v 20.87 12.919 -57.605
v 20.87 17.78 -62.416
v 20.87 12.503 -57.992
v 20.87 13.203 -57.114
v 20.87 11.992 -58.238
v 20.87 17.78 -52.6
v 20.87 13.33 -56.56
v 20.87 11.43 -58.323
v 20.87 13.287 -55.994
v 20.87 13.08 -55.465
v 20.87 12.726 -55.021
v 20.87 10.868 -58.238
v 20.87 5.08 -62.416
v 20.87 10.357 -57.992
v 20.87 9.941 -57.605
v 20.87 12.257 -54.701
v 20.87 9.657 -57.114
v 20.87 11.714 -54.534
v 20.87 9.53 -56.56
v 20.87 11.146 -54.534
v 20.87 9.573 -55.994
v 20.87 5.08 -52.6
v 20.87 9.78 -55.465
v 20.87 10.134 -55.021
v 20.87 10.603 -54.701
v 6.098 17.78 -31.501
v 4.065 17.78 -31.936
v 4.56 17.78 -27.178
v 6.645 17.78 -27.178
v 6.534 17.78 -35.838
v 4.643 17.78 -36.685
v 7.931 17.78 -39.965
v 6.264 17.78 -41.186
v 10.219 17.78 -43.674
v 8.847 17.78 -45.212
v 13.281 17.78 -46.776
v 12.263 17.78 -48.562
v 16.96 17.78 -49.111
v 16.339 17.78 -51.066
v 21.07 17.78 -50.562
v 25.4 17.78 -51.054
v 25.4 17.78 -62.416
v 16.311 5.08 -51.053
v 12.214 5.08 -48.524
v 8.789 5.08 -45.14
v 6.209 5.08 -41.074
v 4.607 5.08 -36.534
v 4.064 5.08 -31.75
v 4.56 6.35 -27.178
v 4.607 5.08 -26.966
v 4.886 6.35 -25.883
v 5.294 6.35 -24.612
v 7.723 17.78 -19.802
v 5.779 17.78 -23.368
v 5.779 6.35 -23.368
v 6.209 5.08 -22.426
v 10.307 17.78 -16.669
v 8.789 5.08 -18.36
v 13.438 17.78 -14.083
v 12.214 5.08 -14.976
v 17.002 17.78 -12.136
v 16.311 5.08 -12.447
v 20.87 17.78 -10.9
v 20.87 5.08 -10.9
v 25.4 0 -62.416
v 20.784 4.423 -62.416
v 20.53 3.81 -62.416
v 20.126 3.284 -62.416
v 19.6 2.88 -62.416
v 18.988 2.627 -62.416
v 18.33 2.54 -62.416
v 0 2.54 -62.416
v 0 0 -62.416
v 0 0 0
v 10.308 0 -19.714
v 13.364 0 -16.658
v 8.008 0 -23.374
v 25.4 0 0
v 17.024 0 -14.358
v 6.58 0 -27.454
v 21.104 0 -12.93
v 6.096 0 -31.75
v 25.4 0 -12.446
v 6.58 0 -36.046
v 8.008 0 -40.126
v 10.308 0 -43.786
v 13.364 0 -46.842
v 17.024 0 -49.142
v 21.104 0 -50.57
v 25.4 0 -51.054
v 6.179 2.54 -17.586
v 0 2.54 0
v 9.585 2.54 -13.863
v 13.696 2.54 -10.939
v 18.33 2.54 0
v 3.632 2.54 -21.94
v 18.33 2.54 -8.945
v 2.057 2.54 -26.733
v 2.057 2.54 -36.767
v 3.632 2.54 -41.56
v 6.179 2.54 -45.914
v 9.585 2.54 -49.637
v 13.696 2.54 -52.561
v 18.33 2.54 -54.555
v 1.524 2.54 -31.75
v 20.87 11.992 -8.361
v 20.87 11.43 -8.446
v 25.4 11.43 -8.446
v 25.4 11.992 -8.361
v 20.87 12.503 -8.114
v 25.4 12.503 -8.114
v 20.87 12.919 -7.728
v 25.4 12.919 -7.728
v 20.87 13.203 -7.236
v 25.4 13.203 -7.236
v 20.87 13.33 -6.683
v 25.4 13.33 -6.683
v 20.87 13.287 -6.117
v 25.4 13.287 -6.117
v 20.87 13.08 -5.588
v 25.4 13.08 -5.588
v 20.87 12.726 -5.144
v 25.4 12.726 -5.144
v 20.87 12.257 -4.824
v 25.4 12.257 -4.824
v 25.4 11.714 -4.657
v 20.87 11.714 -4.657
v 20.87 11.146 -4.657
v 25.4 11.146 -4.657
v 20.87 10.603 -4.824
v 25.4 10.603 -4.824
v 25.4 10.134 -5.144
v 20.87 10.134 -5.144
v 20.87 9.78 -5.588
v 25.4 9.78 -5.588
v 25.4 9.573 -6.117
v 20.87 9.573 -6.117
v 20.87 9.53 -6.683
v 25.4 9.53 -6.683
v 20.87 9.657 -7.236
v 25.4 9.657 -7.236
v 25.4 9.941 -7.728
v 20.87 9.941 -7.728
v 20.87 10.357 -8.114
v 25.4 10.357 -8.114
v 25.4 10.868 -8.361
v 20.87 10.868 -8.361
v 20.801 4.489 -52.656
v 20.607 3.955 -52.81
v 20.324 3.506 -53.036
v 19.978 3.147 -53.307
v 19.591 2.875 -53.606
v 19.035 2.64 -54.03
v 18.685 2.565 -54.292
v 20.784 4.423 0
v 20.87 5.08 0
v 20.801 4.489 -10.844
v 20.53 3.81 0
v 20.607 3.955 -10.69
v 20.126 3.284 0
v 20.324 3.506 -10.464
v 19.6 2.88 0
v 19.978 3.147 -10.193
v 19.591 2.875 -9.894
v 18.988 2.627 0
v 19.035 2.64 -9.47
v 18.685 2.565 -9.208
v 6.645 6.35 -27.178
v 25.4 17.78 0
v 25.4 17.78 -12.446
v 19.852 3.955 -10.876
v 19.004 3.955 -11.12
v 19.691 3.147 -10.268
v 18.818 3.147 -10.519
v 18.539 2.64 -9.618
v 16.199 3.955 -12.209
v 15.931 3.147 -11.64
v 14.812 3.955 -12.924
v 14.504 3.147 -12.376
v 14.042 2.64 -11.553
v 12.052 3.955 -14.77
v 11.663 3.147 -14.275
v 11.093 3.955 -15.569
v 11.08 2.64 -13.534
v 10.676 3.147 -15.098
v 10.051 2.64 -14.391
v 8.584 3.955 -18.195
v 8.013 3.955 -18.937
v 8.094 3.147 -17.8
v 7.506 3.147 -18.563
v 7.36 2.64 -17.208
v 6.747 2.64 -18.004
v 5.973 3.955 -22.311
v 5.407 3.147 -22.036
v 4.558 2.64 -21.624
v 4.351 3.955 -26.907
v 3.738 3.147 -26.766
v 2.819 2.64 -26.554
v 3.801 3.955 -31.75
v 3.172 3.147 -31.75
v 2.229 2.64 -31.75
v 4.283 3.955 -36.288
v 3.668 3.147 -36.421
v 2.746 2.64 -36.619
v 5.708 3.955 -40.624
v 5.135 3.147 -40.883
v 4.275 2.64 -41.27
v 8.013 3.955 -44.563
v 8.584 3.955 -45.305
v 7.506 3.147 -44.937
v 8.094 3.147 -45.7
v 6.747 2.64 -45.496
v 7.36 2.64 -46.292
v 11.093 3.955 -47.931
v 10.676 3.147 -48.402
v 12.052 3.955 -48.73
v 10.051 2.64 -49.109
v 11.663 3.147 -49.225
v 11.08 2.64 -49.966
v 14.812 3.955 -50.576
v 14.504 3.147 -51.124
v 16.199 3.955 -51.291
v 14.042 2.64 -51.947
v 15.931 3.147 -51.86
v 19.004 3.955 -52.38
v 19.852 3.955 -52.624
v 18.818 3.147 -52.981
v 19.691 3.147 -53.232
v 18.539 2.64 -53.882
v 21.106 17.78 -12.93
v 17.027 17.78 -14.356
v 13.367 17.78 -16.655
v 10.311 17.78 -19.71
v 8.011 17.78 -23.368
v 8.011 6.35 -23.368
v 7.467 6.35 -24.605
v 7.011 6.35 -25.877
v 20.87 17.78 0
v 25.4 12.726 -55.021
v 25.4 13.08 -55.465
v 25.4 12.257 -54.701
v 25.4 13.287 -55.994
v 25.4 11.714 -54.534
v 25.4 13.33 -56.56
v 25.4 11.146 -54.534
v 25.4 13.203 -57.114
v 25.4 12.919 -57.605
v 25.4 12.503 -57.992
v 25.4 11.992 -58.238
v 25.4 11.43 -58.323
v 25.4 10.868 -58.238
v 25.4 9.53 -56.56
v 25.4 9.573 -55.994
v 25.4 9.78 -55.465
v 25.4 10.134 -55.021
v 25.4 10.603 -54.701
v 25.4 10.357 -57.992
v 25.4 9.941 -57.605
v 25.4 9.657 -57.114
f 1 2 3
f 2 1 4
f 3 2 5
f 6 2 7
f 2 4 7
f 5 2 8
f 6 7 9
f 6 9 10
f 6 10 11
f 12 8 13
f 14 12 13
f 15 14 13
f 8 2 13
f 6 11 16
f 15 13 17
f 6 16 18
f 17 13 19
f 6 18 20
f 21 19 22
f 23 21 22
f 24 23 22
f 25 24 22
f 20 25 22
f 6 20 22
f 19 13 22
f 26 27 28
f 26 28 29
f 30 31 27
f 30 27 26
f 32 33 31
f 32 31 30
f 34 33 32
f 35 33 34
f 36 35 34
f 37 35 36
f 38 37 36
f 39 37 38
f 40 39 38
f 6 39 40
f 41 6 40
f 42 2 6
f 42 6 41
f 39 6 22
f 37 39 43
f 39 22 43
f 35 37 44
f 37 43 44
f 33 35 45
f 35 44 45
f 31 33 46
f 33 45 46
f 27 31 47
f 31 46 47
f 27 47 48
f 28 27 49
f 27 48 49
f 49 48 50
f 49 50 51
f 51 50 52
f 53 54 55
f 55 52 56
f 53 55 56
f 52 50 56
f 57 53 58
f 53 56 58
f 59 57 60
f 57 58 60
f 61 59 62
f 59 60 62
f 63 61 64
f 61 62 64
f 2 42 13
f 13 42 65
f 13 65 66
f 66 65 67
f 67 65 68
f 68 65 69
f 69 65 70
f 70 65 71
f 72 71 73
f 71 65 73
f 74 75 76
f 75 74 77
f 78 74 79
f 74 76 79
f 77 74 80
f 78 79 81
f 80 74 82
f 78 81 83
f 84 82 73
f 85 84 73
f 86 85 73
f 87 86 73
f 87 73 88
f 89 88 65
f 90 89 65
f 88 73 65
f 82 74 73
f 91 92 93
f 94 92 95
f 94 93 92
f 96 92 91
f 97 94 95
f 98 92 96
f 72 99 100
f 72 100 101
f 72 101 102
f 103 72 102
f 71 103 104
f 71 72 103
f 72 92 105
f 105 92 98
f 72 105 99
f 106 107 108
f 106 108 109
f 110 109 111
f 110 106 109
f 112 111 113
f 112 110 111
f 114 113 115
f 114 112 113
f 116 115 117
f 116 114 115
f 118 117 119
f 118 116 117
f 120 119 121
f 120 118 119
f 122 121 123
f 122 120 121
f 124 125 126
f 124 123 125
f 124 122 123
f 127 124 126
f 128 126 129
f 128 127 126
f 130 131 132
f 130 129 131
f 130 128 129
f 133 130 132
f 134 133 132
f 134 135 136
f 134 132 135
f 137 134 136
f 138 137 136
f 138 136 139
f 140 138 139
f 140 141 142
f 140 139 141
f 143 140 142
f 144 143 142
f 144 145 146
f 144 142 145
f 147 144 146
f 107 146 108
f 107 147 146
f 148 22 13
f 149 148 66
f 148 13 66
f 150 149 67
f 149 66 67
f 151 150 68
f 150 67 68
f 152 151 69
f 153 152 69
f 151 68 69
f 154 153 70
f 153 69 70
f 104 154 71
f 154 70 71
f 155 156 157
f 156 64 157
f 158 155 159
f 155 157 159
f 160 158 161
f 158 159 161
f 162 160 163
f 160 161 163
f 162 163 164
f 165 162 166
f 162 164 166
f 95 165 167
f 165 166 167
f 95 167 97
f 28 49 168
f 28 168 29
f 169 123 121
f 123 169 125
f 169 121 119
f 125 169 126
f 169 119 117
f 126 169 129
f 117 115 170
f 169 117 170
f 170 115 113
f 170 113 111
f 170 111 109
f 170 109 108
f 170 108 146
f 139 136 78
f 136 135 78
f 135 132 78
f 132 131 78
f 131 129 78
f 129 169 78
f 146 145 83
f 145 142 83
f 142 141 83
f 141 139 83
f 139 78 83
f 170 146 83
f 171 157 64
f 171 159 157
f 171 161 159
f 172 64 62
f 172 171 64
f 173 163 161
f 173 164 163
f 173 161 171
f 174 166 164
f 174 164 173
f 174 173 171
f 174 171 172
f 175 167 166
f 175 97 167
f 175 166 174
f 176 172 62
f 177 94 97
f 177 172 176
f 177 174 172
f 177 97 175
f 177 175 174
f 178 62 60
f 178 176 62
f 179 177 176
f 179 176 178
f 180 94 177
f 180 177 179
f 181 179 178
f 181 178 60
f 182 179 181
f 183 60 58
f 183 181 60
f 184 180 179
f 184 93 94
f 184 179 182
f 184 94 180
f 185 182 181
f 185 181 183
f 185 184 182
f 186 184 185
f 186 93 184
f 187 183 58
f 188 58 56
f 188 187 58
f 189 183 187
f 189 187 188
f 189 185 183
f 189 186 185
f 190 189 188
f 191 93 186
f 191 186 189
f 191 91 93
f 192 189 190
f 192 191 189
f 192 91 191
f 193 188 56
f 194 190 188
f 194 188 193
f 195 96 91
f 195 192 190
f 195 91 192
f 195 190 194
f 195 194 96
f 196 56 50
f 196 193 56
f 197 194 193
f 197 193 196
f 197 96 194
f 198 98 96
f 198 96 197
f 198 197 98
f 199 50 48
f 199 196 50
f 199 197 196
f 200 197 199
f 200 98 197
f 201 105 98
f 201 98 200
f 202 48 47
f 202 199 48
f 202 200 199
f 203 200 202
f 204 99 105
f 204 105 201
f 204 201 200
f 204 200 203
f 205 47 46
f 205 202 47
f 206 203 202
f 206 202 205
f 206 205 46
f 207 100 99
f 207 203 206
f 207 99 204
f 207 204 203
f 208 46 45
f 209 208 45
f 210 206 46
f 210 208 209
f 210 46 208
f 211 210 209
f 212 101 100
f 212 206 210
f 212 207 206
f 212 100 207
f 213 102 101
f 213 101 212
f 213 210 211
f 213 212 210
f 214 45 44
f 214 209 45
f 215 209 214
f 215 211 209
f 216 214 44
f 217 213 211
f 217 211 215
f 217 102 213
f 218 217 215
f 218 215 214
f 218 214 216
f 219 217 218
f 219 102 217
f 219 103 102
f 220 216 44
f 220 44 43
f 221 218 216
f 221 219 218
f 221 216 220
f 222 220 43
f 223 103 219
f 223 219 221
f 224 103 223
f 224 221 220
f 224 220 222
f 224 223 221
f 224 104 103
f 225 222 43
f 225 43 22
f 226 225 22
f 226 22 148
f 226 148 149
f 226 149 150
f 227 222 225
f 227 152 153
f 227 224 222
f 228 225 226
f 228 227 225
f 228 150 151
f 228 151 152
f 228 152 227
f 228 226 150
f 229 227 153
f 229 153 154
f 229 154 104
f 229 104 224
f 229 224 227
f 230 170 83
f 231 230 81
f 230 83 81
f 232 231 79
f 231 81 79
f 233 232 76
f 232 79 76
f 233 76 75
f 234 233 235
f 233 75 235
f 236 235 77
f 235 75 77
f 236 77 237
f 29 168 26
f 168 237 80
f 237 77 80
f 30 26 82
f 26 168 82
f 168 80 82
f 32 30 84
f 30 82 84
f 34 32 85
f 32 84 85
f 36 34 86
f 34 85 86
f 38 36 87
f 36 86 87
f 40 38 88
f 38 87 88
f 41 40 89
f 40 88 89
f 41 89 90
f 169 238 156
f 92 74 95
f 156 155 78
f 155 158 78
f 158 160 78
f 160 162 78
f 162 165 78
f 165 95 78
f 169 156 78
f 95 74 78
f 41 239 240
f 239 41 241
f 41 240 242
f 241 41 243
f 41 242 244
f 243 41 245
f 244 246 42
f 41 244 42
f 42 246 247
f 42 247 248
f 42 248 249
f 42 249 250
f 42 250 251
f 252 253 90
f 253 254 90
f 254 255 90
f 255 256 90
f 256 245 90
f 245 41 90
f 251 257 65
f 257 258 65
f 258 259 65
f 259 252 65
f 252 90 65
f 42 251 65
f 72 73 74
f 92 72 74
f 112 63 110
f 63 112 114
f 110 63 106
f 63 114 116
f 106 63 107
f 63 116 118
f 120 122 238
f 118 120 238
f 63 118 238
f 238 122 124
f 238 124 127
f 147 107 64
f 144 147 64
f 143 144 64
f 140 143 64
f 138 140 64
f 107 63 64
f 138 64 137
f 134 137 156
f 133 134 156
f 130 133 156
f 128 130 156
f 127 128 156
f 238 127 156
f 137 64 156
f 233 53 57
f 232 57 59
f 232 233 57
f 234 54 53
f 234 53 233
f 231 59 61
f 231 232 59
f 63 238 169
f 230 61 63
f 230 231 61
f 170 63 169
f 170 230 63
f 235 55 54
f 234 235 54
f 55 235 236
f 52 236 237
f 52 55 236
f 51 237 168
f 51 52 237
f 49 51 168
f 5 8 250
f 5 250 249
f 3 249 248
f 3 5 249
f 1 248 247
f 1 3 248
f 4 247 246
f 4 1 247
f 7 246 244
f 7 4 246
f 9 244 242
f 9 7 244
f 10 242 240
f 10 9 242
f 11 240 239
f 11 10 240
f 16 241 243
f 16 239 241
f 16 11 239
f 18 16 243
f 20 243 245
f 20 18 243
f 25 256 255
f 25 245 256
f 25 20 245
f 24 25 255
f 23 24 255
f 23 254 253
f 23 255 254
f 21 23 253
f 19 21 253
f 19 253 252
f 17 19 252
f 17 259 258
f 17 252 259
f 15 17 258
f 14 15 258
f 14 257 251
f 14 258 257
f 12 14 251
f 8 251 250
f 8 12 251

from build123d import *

# Parameters (mm, degrees)
BOSS_EXTRUDE14_DEPTH    = 2.54
BOSS_EXTRUDE15_DEPTH    = 17.78
FILLET3_R               = 2.54
SKETCH5_R               = 1.905
CUT_EXTRUDE3_DEPTH      = 26.4
CUT_EXTRUDE3_DEPTH_BACK = 1
SKETCH6_W               = 3.81
SKETCH6_H               = 11.43
CUT_EXTRUDE4_DEPTH      = 26.4
CUT_EXTRUDE4_DEPTH_BACK = 1


with BuildPart() as part:
    # Sketch3 → Boss-Extrude14 (new body)
    with BuildSketch(Plane(origin=(0, 0, 0), x_dir=(1, 0, 0), z_dir=(0, 1, 0))):
        with BuildLine():
            Line((0, 62.41624918), (0, 0))
            Line((0, 0), (20.870167944, 0))
            Line((20.870167944, 0), (20.870167944, 10.900407257))
            ThreePointArc((20.870167944, 10.900407257), (4.064, 31.75), (20.870167944, 52.599592743))
            Line((20.870167944, 52.599592743), (20.870167944, 62.41624918))
            Line((20.870167944, 62.41624918), (0, 62.41624918))
        make_face()
    extrude(amount=BOSS_EXTRUDE14_DEPTH)

    # Sketch3<18> → Boss-Extrude15 (add)
    with BuildSketch(Plane(origin=(0, 0, 0), x_dir=(1, 0, 0), z_dir=(0, 1, 0))):
        with BuildLine():
            Line((20.870167944, 10.900407257), (20.870167944, 0))
            Line((20.870167944, 0), (25.4, 0))
            Line((25.4, 0), (25.4, 12.446))
            ThreePointArc((25.4, 12.446), (6.096, 31.75), (25.4, 51.054))
            Line((25.4, 51.054), (25.4, 62.41624918))
            Line((25.4, 62.41624918), (20.870167944, 62.41624918))
            Line((20.870167944, 62.41624918), (20.870167944, 52.599592743))
            ThreePointArc((20.870167944, 52.599592743), (4.064, 31.75), (20.870167944, 10.900407257))
        make_face()
    extrude(amount=BOSS_EXTRUDE15_DEPTH)

    # Fillet3
    fillet3_edges = [part.edges().sort_by_distance(p)[0] for p in [
        (20.870167944, 2.54, -57.507920962),
        (20.870167944, 2.54, -5.450203629),
        (4.064, 2.54, -31.75),
    ]]
    fillet(fillet3_edges, radius=FILLET3_R)

    # Sketch5 → Cut-Extrude3 (cut, two sides)
    with BuildSketch(Plane(origin=(0, 0, 0), x_dir=(0, 0, -1), z_dir=(1, 0, 0))) as cut_extrude3_sk:
        with Locations((6.5405, 11.43)):
            Circle(SKETCH5_R)
        with Locations((56.41762459, 11.43)):
            Circle(SKETCH5_R)
    extrude(amount=CUT_EXTRUDE3_DEPTH, mode=Mode.SUBTRACT)
    extrude(cut_extrude3_sk.sketch, amount=-CUT_EXTRUDE3_DEPTH_BACK, mode=Mode.SUBTRACT)

    # Sketch6 → Cut-Extrude4 (cut, two sides)
    with BuildSketch(Plane(origin=(0, 0, 0), x_dir=(0, 0, -1), z_dir=(1, 0, 0))) as cut_extrude4_sk:
        with Locations((25.273, 12.065)):
            Rectangle(SKETCH6_W, SKETCH6_H)
    extrude(amount=CUT_EXTRUDE4_DEPTH, mode=Mode.SUBTRACT)
    extrude(cut_extrude4_sk.sketch, amount=-CUT_EXTRUDE4_DEPTH_BACK, mode=Mode.SUBTRACT)


solid = part.part
